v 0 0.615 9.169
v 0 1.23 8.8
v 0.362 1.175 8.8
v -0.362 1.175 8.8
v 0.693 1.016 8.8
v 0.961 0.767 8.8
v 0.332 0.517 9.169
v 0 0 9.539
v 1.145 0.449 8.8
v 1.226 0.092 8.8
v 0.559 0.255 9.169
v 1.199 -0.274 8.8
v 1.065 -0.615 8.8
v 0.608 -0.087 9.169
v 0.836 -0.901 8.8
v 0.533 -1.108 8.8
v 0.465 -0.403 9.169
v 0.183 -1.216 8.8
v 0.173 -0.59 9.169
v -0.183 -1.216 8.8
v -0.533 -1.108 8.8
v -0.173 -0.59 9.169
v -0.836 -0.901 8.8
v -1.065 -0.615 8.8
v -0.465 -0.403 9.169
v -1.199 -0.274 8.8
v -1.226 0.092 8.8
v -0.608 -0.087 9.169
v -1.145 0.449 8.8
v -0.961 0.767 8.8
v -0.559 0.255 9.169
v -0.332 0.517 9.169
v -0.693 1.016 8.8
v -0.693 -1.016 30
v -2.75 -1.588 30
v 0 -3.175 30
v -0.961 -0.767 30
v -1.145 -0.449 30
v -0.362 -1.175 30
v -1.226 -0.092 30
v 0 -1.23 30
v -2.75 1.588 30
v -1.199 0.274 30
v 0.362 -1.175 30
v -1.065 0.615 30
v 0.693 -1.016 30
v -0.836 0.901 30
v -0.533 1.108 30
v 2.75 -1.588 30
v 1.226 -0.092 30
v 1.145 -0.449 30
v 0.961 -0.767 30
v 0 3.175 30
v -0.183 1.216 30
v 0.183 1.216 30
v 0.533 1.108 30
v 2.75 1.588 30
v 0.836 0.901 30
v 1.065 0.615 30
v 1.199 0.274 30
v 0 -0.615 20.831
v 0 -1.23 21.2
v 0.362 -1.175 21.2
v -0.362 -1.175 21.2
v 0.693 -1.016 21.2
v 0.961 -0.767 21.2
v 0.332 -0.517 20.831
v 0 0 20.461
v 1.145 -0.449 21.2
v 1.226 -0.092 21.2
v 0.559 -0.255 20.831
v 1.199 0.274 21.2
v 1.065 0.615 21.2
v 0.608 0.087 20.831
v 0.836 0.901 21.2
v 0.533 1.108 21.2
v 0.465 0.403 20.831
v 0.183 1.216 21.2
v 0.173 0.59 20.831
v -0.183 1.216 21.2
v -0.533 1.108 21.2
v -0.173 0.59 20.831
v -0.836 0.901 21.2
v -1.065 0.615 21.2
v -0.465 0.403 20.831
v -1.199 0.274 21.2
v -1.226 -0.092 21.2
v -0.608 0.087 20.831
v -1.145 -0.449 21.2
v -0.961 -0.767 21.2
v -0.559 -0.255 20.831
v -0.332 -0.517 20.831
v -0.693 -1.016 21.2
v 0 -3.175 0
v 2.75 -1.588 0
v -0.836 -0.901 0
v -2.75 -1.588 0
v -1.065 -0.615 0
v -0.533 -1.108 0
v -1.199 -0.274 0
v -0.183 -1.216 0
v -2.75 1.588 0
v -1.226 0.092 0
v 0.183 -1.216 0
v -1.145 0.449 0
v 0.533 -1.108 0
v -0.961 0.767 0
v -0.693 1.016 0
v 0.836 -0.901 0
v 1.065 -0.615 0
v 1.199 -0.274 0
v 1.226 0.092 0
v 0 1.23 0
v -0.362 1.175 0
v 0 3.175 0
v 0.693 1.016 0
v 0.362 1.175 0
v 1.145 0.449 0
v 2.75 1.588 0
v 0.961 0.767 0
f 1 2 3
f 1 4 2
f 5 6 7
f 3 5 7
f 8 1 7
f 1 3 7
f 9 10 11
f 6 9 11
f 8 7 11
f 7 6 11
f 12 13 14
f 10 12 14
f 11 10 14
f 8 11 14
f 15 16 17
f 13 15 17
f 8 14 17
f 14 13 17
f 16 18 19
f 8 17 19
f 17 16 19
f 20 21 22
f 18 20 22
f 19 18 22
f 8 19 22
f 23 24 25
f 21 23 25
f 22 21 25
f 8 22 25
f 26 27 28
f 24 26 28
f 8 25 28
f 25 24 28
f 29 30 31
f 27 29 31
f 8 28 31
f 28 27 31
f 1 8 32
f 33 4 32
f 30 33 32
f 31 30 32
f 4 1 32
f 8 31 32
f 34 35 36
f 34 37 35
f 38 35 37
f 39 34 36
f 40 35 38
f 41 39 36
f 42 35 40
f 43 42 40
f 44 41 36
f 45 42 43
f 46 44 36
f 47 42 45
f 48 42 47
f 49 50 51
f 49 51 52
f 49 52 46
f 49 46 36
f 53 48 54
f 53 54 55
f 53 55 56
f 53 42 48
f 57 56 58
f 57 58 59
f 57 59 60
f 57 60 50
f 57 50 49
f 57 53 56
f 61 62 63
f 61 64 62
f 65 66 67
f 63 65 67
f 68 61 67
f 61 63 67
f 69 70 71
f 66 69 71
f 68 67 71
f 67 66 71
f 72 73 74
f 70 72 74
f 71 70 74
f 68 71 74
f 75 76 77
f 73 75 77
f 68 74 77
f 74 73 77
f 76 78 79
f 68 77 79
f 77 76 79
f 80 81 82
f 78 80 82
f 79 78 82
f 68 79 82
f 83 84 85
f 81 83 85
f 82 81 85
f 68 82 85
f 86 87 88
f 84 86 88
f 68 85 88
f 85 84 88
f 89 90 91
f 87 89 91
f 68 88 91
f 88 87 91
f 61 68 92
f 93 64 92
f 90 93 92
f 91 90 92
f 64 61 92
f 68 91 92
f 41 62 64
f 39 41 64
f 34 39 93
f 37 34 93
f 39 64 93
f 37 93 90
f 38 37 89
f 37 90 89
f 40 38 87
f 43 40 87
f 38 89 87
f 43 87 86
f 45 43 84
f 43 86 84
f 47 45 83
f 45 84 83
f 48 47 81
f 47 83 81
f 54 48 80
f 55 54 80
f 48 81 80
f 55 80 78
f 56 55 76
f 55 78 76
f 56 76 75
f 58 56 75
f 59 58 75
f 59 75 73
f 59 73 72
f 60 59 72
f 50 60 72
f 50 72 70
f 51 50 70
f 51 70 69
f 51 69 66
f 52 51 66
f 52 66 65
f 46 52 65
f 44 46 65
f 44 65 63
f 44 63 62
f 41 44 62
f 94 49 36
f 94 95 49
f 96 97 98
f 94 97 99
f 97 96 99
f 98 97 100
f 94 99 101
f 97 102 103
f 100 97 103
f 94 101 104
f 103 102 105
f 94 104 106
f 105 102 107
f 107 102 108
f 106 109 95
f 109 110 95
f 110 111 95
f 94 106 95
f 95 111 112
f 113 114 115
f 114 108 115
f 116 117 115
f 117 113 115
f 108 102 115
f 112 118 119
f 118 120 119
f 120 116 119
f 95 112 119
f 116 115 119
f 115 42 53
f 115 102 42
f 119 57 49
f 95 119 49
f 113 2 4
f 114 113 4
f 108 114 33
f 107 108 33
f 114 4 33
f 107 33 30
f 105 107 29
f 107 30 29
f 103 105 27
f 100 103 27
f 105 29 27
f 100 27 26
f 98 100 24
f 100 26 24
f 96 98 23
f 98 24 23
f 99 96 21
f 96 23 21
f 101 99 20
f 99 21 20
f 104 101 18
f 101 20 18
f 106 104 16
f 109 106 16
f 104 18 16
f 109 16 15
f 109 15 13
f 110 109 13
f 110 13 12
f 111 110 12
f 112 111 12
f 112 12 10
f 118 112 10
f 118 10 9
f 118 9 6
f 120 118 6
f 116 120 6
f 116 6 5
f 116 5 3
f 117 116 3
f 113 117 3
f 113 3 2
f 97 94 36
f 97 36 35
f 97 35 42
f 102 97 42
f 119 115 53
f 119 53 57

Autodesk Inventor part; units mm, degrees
ref_plane "YZ Plane" through (0, 0, 0) normal (1, 0, 0) x (0, 1, 0)
ref_plane "XZ Plane" through (0, 0, 0) normal (0, 1, 0) x (-1, 0, 0)
ref_plane "XY Plane" through (0, 0, 0) normal (0, 0, 1) x (1, 0, 0)
sketch "スケッチ1" plane through (0, 0, 0) normal (0, 0, 1) x (1, 0, 0)
  line L0 (0, 3.1754) -> (2.75, 1.5877)
  line L1 (2.75, 1.5877) -> (2.75, -1.5877)
  line L2 (2.75, -1.5877) -> (0, -3.1754)
  line L3 (0, -3.1754) -> (-2.75, -1.5877)
  line L4 (-2.75, -1.5877) -> (-2.75, 1.5877)
  line L5 (-2.75, 1.5877) -> (0, 3.1754)
  point P0 (0, 0)
  point P1 (0, 0)
  dimension "d0" = 5.5
extrude "押し出し1" add sketch "スケッチ1" along normal blind 30
sketch "スケッチ2" plane through (0, 0, 30) normal (0, 0, 1) x (1, 0, 0)
  line L0 (2.75, 1.5877) -> (0, 3.1754) projected
  line L1 (0, 3.1754) -> (-2.75, 1.5877) projected
  line L2 (-2.75, 1.5877) -> (-2.75, -1.5877) projected
  line L3 (-2.75, -1.5877) -> (0, -3.1754) projected
  line L4 (0, -3.1754) -> (2.75, -1.5877) projected
  line L5 (2.75, -1.5877) -> (2.75, 1.5877) projected
  point P0 (0, 0)
hole "穴1" at (0, 0, 30) direction (0, 0, -1) diameter 2.459 depth 8.8 tip angle 118 thread size "M3x0.5" class "6H" standard "ISO Metric profile"
sketch "スケッチ3" plane through (0, 0, 0) normal (0, 0, -1) x (-1, 0, 0)
  line L0 (0, 3.1754) -> (-2.75, 1.5877) projected
  line L1 (-2.75, 1.5877) -> (-2.75, -1.5877) projected
  line L2 (-2.75, -1.5877) -> (0, -3.1754) projected
  line L3 (0, -3.1754) -> (2.75, -1.5877) projected
  line L4 (2.75, -1.5877) -> (2.75, 1.5877) projected
  line L5 (2.75, 1.5877) -> (0, 3.1754) projected
  point P0 (0, 0)
hole "穴2" at (0, 0, 0) direction (0, 0, 1) diameter 2.459 depth 8.8 tip angle 118 thread size "M3x0.5" class "6H" standard "ISO Metric profile"
properties part number "黄銅スペーサー（六角）_ASB-330E" material "真鍮、ソフト イエロー"
